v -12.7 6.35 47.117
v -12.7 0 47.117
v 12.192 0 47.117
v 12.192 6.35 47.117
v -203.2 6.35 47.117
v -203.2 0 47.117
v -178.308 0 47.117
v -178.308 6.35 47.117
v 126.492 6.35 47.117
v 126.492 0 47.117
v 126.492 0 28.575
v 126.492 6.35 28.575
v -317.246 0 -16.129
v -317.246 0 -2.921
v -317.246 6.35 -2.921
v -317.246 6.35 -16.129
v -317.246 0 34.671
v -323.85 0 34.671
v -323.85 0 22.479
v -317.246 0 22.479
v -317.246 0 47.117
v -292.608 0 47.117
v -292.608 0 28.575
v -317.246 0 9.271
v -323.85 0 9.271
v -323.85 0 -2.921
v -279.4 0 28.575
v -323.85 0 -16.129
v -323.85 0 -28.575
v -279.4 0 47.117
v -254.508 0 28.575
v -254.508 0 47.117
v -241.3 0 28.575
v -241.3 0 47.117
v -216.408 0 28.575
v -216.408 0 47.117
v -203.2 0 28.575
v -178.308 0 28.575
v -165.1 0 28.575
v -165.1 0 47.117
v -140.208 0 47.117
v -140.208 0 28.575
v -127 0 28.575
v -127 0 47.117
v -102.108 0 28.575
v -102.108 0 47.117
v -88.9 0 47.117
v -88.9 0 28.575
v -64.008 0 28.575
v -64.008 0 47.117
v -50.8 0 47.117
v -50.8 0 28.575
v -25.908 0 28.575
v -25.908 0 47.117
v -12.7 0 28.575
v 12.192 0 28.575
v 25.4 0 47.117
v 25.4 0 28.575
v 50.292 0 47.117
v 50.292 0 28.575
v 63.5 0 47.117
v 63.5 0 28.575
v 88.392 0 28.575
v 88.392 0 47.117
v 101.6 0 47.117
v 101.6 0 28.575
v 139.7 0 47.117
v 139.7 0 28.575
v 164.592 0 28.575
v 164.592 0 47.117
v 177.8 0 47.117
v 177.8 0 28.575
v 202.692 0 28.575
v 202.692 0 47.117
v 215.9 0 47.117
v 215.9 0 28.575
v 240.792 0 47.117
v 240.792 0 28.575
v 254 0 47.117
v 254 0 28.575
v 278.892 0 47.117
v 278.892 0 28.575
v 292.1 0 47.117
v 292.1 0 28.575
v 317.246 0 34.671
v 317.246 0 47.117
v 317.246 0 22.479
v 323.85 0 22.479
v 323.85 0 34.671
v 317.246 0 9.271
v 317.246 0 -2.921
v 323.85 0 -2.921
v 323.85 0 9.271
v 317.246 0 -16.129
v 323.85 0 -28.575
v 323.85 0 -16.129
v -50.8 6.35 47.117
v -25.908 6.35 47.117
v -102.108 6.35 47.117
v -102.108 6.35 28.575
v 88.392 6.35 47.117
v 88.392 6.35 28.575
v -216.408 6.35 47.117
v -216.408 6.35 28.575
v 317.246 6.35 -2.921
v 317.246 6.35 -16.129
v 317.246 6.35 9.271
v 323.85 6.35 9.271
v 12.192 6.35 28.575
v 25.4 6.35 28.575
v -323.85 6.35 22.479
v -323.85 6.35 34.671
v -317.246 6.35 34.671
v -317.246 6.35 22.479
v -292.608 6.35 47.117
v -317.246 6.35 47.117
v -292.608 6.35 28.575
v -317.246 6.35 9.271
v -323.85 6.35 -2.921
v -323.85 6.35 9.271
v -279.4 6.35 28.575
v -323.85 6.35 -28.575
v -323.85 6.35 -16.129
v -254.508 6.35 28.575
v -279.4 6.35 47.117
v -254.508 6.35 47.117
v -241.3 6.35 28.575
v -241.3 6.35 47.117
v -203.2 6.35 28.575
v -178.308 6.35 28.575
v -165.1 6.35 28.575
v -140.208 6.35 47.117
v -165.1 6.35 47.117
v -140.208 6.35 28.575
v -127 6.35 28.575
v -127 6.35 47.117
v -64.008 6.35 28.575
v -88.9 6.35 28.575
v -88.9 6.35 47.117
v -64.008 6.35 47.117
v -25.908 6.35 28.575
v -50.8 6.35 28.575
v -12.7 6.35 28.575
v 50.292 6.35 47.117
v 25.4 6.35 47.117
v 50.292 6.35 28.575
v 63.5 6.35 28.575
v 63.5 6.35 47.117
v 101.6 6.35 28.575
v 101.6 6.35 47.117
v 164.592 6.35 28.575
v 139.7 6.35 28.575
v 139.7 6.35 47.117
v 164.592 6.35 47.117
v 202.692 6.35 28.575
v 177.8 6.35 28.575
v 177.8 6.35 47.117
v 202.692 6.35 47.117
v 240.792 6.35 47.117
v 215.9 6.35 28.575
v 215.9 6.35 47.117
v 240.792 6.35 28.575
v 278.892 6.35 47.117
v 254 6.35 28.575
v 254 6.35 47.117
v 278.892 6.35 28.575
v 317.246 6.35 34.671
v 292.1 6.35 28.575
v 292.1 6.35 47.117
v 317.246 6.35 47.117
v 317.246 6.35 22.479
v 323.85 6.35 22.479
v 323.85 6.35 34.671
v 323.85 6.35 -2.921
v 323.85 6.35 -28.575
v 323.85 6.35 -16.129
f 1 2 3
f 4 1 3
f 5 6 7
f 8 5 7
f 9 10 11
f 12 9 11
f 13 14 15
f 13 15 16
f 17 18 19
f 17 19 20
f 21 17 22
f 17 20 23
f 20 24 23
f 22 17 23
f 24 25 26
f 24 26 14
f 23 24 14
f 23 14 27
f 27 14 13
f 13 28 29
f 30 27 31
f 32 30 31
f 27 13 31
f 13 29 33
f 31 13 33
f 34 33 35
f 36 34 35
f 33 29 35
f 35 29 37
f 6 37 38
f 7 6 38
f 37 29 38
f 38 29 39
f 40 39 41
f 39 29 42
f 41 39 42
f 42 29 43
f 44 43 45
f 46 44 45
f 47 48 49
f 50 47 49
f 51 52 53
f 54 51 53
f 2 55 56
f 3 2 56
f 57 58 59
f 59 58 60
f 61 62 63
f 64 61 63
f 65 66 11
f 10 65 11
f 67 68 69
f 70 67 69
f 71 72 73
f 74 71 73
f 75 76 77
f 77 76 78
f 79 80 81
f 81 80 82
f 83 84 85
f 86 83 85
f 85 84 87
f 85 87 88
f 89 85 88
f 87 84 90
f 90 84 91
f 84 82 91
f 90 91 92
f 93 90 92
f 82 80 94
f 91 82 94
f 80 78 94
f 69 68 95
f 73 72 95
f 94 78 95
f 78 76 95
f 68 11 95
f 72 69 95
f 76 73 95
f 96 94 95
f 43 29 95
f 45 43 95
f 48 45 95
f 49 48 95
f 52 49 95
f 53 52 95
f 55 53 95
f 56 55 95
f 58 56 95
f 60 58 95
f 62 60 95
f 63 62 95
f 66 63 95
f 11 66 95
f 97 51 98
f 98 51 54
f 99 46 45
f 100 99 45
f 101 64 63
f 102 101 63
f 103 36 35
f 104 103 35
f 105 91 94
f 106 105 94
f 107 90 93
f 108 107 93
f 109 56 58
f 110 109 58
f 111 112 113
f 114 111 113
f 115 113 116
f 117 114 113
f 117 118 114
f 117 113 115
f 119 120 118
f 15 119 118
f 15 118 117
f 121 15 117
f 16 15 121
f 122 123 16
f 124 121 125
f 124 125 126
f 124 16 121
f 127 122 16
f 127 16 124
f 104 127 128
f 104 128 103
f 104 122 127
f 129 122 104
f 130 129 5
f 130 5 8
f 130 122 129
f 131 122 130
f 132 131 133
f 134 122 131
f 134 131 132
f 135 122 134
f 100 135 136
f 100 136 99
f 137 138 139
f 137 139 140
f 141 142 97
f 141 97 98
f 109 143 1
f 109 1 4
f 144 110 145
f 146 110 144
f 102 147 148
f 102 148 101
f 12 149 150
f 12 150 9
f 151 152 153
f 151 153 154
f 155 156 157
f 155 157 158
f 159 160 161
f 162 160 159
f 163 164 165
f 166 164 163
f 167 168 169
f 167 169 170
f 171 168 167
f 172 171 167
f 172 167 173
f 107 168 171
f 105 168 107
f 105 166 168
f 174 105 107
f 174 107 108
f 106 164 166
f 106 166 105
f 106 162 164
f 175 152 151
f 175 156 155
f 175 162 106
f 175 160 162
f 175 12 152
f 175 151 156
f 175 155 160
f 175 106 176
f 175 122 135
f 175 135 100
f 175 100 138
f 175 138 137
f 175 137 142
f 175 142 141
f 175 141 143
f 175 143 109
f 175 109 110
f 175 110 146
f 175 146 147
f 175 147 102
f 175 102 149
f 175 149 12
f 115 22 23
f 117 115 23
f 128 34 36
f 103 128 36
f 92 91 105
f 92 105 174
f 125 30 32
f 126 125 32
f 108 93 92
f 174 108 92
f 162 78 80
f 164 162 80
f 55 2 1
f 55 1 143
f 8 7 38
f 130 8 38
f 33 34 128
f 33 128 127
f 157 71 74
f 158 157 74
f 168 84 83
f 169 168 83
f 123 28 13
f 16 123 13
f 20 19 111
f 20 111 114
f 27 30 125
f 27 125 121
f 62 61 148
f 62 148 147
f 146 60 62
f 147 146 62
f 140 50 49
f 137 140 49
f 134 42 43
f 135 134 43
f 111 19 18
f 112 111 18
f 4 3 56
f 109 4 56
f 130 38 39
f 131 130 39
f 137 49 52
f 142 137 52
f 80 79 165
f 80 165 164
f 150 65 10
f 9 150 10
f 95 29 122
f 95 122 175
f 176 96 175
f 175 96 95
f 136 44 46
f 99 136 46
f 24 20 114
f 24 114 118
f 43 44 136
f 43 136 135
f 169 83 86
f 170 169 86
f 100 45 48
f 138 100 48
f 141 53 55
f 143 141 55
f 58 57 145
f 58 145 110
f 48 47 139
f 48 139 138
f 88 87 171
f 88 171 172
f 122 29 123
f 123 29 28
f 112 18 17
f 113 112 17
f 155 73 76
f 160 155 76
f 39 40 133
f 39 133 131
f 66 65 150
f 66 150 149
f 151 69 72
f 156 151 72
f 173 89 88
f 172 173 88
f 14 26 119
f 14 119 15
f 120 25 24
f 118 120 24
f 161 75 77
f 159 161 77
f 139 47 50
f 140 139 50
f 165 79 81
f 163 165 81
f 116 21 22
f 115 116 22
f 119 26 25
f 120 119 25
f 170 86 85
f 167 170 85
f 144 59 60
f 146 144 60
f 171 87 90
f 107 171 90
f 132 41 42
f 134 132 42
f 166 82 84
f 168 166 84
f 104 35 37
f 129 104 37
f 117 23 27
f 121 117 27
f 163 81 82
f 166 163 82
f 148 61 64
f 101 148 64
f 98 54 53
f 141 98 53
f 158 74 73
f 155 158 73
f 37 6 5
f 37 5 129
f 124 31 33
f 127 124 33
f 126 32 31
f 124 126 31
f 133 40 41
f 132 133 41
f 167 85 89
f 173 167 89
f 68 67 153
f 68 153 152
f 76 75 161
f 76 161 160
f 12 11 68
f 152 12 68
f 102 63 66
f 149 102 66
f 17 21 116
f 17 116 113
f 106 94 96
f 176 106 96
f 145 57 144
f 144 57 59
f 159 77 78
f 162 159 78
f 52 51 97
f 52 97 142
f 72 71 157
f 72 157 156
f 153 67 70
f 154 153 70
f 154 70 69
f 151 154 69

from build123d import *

# Parameters (mm, degrees)
SKETCH1_W           = 647.7
SKETCH1_H           = 57.15
BOSS_EXTRUDE1_DEPTH = 6.35
SKETCH3_W           = 24.892
SKETCH3_H           = 18.542
BOSS_EXTRUDE2_DEPTH = 6.35
SKETCH4_W           = 13.208
SKETCH4_H           = 13.208
CUT_EXTRUDE2_DEPTH  = 328.321182769


with BuildPart() as part:
    # Sketch1 → Boss-Extrude1 (new body)
    with BuildSketch(Plane(origin=(0, 0, 0), x_dir=(1, 0, 0), z_dir=(0, 1, 0))):
        Rectangle(SKETCH1_W, SKETCH1_H)
    extrude(amount=BOSS_EXTRUDE1_DEPTH)

    # Sketch3 → Boss-Extrude2 (add)
    with BuildSketch(Plane(origin=(0, 0, 0), x_dir=(1, 0, 0), z_dir=(0, 1, 0))):
        Polygon((-317.5, -47.117), (-292.608, -47.117), (-292.608, -28.575), (-317.5, -28.575), (-323.85, -28.575), (-323.85, -47.117), align=None)
        with Locations((-266.954, -37.846)):
            Rectangle(SKETCH3_W, SKETCH3_H)
        with Locations((-228.854, -37.846)):
            Rectangle(SKETCH3_W, SKETCH3_H)
        with Locations((-190.754, -37.846)):
            Rectangle(SKETCH3_W, SKETCH3_H)
        with Locations((-152.654, -37.846)):
            Rectangle(SKETCH3_W, SKETCH3_H)
        with Locations((-114.554, -37.846)):
            Rectangle(SKETCH3_W, SKETCH3_H)
        with Locations((-76.454, -37.846)):
            Rectangle(SKETCH3_W, SKETCH3_H)
        with Locations((-38.354, -37.846)):
            Rectangle(SKETCH3_W, SKETCH3_H)
        with Locations((-0.254, -37.846)):
            Rectangle(SKETCH3_W, SKETCH3_H)
        with Locations((37.846, -37.846)):
            Rectangle(SKETCH3_W, SKETCH3_H)
        with Locations((75.946, -37.846)):
            Rectangle(SKETCH3_W, SKETCH3_H)
        with Locations((114.046, -37.846)):
            Rectangle(SKETCH3_W, SKETCH3_H)
        with Locations((152.146, -37.846)):
            Rectangle(SKETCH3_W, SKETCH3_H)
        with Locations((190.246, -37.846)):
            Rectangle(SKETCH3_W, SKETCH3_H)
        with Locations((228.346, -37.846)):
            Rectangle(SKETCH3_W, SKETCH3_H)
        with Locations((266.446, -37.846)):
            Rectangle(SKETCH3_W, SKETCH3_H)
        Polygon((316.992, -28.575), (292.1, -28.575), (292.1, -47.117), (316.992, -47.117), (323.85, -47.117), (323.85, -28.575), align=None)
    extrude(amount=BOSS_EXTRUDE2_DEPTH)

    # Sketch4 → Cut-Extrude2 (cut, through all)
    with BuildSketch(Plane(origin=(0, 0, 0), x_dir=(1, 0, 0), z_dir=(0, 1, 0))):
        with Locations((-323.85, 9.525)):
            Rectangle(SKETCH4_W, SKETCH4_H)
        with Locations((-323.85, -15.875)):
            Rectangle(SKETCH4_W, SKETCH4_H)
        with Locations((323.85, -15.875)):
            Rectangle(SKETCH4_W, SKETCH4_H)
        with Locations((323.85, 9.525)):
            Rectangle(SKETCH4_W, SKETCH4_H)
        with Locations((-323.85, -41.275)):
            Rectangle(SKETCH4_W, SKETCH4_H)
        with Locations((323.85, -41.275)):
            Rectangle(SKETCH4_W, SKETCH4_H)
    extrude(amount=CUT_EXTRUDE2_DEPTH, mode=Mode.SUBTRACT)


solid = part.part
